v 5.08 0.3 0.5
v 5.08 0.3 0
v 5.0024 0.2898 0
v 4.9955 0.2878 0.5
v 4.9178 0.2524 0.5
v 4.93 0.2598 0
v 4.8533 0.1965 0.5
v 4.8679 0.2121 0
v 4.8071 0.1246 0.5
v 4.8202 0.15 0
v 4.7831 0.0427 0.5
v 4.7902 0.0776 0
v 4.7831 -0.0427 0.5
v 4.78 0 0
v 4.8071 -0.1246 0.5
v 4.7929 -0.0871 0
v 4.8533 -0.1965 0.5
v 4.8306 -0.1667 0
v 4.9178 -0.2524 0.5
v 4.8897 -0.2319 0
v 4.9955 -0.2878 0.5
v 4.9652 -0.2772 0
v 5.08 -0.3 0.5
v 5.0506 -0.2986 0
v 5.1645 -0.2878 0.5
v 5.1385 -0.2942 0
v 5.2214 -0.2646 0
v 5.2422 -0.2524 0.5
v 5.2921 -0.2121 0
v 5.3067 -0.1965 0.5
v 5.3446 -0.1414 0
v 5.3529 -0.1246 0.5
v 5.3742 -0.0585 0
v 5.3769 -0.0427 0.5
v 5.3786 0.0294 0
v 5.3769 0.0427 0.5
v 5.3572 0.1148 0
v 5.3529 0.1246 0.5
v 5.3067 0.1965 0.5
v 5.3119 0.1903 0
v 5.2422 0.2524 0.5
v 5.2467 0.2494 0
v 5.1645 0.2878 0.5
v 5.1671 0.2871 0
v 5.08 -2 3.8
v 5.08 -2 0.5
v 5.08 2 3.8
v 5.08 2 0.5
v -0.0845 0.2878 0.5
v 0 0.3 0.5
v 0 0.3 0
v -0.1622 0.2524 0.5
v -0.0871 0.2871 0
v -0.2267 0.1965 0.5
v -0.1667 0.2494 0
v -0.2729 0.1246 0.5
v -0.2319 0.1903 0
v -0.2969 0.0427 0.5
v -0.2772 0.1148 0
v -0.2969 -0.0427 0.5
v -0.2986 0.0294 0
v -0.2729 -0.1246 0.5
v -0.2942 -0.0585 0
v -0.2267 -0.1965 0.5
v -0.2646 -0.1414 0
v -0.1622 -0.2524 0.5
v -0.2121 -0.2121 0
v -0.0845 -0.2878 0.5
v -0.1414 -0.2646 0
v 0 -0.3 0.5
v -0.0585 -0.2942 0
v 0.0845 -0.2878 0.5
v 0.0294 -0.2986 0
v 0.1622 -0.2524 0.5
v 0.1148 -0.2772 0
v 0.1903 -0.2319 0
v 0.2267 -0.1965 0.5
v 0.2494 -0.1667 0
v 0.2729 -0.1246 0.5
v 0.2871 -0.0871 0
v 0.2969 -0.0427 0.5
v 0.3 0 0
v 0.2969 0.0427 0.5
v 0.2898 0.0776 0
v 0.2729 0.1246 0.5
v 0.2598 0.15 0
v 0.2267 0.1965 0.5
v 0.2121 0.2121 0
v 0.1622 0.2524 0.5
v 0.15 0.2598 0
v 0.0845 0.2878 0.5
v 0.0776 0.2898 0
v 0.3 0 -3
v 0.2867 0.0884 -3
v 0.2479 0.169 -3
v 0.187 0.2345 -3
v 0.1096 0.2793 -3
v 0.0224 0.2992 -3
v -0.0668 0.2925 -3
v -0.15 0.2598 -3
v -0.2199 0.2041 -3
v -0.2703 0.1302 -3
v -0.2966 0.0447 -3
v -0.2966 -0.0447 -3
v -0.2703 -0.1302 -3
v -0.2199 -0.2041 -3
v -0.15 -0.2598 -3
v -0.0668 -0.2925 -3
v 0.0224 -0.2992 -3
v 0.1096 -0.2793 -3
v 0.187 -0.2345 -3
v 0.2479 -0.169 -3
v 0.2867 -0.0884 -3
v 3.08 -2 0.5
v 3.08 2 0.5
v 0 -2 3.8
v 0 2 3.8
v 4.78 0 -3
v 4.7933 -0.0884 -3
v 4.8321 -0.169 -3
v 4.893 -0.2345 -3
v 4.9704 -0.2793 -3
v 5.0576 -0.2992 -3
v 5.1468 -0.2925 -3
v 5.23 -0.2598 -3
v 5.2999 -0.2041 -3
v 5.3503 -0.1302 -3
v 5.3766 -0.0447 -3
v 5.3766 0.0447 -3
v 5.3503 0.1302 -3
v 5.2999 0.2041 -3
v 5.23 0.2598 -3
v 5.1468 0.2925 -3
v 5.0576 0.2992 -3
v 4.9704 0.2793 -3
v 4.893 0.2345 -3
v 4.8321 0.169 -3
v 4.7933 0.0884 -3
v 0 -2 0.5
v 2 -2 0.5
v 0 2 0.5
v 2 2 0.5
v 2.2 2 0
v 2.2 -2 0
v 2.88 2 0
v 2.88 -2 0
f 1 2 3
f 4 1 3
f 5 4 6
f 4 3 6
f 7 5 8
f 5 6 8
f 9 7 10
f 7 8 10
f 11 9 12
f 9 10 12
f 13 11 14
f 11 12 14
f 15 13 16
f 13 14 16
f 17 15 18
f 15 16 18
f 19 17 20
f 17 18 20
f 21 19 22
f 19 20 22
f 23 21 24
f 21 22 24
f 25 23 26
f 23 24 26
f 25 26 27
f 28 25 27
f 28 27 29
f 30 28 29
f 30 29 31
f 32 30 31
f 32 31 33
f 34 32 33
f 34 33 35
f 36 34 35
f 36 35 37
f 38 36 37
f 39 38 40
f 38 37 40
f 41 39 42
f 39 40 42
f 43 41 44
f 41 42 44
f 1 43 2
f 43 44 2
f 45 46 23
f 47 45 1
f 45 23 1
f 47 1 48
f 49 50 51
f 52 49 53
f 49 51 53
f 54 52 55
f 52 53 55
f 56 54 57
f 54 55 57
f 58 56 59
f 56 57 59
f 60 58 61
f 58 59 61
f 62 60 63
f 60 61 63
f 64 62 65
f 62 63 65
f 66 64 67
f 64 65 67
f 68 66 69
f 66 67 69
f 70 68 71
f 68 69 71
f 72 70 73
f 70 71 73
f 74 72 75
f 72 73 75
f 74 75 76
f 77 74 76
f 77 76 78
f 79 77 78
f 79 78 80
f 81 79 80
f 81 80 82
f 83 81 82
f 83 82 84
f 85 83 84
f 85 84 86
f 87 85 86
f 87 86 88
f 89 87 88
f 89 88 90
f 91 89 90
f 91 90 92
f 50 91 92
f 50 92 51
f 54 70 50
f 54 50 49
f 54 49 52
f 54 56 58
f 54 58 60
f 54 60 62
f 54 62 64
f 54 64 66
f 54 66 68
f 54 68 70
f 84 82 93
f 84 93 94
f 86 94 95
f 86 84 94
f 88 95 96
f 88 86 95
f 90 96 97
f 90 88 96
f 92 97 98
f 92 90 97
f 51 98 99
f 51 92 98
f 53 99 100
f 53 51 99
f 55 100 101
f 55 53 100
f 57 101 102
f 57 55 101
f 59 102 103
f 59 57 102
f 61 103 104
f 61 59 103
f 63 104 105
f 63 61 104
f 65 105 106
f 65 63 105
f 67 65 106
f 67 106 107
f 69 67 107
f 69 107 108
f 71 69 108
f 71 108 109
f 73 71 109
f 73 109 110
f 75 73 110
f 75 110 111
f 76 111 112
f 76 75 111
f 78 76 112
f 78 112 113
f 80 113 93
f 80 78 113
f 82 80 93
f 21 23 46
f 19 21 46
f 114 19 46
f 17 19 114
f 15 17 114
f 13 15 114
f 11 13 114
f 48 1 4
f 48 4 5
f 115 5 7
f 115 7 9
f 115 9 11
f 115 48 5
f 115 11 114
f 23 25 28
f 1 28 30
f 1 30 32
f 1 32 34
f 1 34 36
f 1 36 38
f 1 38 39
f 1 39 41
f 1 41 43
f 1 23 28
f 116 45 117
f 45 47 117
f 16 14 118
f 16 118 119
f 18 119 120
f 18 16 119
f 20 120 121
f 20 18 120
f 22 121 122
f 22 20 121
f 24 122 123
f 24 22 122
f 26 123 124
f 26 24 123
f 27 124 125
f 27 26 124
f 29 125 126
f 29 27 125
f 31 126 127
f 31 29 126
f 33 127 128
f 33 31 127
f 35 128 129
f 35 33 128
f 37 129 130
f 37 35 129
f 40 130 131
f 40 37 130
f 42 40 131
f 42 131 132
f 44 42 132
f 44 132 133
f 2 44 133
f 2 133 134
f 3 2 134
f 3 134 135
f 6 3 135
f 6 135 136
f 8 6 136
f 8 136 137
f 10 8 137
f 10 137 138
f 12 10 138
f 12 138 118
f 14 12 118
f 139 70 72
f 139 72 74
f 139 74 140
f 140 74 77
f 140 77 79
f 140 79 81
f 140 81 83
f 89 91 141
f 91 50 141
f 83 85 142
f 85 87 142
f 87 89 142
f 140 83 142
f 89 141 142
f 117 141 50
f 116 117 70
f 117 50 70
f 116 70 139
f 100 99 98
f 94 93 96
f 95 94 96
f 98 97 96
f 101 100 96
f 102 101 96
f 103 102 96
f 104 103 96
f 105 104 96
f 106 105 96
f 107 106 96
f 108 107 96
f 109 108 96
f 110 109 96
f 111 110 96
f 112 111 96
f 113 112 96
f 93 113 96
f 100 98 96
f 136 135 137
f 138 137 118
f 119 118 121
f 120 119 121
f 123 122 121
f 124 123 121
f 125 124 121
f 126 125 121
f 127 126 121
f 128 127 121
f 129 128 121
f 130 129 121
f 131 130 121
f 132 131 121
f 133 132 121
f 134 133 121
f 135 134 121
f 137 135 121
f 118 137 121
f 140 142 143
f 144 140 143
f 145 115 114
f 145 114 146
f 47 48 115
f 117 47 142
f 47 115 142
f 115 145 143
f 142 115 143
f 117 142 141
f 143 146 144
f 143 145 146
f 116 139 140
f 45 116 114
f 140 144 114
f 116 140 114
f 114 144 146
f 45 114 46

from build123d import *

# Parameters (mm, degrees)
EXTRUDE_1_DEPTH     = 3.8
CUT_EXTRUDE_1_DEPTH = 5.6
SKETCH_4_R          = 0.3
EXTRUDE_2_DEPTH     = 3
EXTRUDE_2_2_DEPTH   = 3
SKETCH_4_2_R        = 0.3
EXTRUDE_3_DEPTH     = 0.5


with BuildPart() as part:
    # Эскиз2 → Вытянуть1 (new body)
    with BuildSketch(Plane.XY):
        Polygon((2.54, -2), (0, -2), (0, 0), (0, 2), (2.54, 2), (5.08, 2), (5.08, 0), (5.08, -2), align=None)
    extrude(amount=EXTRUDE_1_DEPTH)

    # Эскиз3 → Вырез-Вытянуть1 (cut)
    with BuildSketch(Plane(origin=(0, 2, 0), x_dir=(-1, 0, 0), z_dir=(0, 1, 0))):
        Polygon((0, 0), (0, 0.5), (-2, 0.5), (-2.2, 0), align=None)
        Polygon((-2.88, 0), (-5.08, 0), (-5.08, 0.5), (-3.08, 0.5), align=None)
    extrude(amount=-CUT_EXTRUDE_1_DEPTH, mode=Mode.SUBTRACT)



with BuildPart() as body_2:
    # Эскиз4 → Вытянуть2 (new body)
    with BuildSketch(Plane.XY):
        Circle(SKETCH_4_R)
    extrude(amount=-EXTRUDE_2_DEPTH)


with BuildPart() as body_3:
    # Эскиз4 → Extrude 2 2 (new body)
    with BuildSketch(Plane.XY):
        with Locations(Location((5.08, 0, 0), (0, 0, 180))):
            Circle(SKETCH_4_R)
    extrude(amount=-EXTRUDE_2_2_DEPTH)


with BuildPart() as part_1:
    add(part.part)

    add(body_2.part)  # Вытянуть3 merges body 2

    add(body_3.part)  # Вытянуть3 merges body 3
    # Эскиз4<2> → Вытянуть3 (add)
    with BuildSketch(Plane.XY):
        with Locations(Location((0, 0, 0), (0, 0, 90))):
            Circle(SKETCH_4_2_R)
        with Locations(Location((5.08, 0, 0), (0, 0, 90))):
            Circle(SKETCH_4_2_R)
    extrude(amount=EXTRUDE_3_DEPTH)


solid = part_1.part
